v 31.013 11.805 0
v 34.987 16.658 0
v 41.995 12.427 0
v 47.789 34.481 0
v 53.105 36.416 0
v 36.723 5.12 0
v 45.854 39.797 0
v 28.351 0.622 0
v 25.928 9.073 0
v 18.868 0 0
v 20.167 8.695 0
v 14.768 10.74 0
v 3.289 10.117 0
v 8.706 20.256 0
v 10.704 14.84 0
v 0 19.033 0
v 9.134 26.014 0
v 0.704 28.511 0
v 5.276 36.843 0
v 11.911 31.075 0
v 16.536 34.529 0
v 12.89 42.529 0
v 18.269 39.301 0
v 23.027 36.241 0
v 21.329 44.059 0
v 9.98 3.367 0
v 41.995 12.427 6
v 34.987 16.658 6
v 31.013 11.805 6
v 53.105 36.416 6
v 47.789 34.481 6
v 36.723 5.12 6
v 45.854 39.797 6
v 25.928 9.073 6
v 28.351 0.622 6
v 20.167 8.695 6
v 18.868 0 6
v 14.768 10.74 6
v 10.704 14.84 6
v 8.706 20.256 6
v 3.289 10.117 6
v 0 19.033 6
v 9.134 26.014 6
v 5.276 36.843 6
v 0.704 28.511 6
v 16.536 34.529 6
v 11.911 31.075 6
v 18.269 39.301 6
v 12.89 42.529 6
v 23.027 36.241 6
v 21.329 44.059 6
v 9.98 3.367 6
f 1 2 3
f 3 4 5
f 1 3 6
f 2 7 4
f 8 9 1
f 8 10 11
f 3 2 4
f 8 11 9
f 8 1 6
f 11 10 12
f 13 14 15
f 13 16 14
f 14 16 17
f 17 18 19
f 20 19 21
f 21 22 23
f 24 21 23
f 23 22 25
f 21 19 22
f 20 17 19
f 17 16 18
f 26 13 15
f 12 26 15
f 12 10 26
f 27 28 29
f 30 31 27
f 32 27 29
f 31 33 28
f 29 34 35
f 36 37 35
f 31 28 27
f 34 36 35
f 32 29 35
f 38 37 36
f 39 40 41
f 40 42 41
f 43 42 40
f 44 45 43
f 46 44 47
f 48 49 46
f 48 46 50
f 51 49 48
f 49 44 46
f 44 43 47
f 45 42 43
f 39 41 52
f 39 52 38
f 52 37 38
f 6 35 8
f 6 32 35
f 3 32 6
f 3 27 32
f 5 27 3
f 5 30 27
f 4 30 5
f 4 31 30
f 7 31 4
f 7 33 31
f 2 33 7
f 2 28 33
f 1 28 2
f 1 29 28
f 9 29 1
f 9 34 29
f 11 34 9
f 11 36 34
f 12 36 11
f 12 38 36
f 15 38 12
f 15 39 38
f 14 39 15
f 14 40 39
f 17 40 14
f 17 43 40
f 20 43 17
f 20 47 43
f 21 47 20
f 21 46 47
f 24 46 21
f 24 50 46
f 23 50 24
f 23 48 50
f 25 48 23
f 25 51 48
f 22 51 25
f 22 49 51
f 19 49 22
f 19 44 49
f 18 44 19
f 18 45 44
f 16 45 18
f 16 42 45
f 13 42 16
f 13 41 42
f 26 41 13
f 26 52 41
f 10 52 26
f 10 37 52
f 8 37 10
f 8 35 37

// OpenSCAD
$fn = 32;

// ----------------------------------------------------------------------
// Hook plate: curl radius 18 mm over 245 degrees, 8 mm thick band
// ----------------------------------------------------------------------

// --- parameters (mm) ---
profile_height = 6;       // extrusion height
profile_points = 26;      // points of the closed outline

profile = [[18.269, 39.301], [21.329, 44.059], [12.89, 42.529], [5.276, 36.843], [0.704, 28.511], [0, 19.033], [3.289, 10.117], [9.98, 3.367], [18.868, 0], [28.351, 0.622], [36.723, 5.12], [41.995, 12.427], [53.105, 36.416], [47.789, 34.481], [45.854, 39.797], [34.987, 16.658], [31.013, 11.805], [25.928, 9.073], [20.167, 8.695], [14.768, 10.74], [10.704, 14.84], [8.706, 20.256], [9.134, 26.014], [11.911, 31.075], [16.536, 34.529], [23.027, 36.241]];  // single closed polygon, 26 points, counter clockwise

// --- the one profile operation ---
linear_extrude(height = profile_height) polygon(points = profile);
